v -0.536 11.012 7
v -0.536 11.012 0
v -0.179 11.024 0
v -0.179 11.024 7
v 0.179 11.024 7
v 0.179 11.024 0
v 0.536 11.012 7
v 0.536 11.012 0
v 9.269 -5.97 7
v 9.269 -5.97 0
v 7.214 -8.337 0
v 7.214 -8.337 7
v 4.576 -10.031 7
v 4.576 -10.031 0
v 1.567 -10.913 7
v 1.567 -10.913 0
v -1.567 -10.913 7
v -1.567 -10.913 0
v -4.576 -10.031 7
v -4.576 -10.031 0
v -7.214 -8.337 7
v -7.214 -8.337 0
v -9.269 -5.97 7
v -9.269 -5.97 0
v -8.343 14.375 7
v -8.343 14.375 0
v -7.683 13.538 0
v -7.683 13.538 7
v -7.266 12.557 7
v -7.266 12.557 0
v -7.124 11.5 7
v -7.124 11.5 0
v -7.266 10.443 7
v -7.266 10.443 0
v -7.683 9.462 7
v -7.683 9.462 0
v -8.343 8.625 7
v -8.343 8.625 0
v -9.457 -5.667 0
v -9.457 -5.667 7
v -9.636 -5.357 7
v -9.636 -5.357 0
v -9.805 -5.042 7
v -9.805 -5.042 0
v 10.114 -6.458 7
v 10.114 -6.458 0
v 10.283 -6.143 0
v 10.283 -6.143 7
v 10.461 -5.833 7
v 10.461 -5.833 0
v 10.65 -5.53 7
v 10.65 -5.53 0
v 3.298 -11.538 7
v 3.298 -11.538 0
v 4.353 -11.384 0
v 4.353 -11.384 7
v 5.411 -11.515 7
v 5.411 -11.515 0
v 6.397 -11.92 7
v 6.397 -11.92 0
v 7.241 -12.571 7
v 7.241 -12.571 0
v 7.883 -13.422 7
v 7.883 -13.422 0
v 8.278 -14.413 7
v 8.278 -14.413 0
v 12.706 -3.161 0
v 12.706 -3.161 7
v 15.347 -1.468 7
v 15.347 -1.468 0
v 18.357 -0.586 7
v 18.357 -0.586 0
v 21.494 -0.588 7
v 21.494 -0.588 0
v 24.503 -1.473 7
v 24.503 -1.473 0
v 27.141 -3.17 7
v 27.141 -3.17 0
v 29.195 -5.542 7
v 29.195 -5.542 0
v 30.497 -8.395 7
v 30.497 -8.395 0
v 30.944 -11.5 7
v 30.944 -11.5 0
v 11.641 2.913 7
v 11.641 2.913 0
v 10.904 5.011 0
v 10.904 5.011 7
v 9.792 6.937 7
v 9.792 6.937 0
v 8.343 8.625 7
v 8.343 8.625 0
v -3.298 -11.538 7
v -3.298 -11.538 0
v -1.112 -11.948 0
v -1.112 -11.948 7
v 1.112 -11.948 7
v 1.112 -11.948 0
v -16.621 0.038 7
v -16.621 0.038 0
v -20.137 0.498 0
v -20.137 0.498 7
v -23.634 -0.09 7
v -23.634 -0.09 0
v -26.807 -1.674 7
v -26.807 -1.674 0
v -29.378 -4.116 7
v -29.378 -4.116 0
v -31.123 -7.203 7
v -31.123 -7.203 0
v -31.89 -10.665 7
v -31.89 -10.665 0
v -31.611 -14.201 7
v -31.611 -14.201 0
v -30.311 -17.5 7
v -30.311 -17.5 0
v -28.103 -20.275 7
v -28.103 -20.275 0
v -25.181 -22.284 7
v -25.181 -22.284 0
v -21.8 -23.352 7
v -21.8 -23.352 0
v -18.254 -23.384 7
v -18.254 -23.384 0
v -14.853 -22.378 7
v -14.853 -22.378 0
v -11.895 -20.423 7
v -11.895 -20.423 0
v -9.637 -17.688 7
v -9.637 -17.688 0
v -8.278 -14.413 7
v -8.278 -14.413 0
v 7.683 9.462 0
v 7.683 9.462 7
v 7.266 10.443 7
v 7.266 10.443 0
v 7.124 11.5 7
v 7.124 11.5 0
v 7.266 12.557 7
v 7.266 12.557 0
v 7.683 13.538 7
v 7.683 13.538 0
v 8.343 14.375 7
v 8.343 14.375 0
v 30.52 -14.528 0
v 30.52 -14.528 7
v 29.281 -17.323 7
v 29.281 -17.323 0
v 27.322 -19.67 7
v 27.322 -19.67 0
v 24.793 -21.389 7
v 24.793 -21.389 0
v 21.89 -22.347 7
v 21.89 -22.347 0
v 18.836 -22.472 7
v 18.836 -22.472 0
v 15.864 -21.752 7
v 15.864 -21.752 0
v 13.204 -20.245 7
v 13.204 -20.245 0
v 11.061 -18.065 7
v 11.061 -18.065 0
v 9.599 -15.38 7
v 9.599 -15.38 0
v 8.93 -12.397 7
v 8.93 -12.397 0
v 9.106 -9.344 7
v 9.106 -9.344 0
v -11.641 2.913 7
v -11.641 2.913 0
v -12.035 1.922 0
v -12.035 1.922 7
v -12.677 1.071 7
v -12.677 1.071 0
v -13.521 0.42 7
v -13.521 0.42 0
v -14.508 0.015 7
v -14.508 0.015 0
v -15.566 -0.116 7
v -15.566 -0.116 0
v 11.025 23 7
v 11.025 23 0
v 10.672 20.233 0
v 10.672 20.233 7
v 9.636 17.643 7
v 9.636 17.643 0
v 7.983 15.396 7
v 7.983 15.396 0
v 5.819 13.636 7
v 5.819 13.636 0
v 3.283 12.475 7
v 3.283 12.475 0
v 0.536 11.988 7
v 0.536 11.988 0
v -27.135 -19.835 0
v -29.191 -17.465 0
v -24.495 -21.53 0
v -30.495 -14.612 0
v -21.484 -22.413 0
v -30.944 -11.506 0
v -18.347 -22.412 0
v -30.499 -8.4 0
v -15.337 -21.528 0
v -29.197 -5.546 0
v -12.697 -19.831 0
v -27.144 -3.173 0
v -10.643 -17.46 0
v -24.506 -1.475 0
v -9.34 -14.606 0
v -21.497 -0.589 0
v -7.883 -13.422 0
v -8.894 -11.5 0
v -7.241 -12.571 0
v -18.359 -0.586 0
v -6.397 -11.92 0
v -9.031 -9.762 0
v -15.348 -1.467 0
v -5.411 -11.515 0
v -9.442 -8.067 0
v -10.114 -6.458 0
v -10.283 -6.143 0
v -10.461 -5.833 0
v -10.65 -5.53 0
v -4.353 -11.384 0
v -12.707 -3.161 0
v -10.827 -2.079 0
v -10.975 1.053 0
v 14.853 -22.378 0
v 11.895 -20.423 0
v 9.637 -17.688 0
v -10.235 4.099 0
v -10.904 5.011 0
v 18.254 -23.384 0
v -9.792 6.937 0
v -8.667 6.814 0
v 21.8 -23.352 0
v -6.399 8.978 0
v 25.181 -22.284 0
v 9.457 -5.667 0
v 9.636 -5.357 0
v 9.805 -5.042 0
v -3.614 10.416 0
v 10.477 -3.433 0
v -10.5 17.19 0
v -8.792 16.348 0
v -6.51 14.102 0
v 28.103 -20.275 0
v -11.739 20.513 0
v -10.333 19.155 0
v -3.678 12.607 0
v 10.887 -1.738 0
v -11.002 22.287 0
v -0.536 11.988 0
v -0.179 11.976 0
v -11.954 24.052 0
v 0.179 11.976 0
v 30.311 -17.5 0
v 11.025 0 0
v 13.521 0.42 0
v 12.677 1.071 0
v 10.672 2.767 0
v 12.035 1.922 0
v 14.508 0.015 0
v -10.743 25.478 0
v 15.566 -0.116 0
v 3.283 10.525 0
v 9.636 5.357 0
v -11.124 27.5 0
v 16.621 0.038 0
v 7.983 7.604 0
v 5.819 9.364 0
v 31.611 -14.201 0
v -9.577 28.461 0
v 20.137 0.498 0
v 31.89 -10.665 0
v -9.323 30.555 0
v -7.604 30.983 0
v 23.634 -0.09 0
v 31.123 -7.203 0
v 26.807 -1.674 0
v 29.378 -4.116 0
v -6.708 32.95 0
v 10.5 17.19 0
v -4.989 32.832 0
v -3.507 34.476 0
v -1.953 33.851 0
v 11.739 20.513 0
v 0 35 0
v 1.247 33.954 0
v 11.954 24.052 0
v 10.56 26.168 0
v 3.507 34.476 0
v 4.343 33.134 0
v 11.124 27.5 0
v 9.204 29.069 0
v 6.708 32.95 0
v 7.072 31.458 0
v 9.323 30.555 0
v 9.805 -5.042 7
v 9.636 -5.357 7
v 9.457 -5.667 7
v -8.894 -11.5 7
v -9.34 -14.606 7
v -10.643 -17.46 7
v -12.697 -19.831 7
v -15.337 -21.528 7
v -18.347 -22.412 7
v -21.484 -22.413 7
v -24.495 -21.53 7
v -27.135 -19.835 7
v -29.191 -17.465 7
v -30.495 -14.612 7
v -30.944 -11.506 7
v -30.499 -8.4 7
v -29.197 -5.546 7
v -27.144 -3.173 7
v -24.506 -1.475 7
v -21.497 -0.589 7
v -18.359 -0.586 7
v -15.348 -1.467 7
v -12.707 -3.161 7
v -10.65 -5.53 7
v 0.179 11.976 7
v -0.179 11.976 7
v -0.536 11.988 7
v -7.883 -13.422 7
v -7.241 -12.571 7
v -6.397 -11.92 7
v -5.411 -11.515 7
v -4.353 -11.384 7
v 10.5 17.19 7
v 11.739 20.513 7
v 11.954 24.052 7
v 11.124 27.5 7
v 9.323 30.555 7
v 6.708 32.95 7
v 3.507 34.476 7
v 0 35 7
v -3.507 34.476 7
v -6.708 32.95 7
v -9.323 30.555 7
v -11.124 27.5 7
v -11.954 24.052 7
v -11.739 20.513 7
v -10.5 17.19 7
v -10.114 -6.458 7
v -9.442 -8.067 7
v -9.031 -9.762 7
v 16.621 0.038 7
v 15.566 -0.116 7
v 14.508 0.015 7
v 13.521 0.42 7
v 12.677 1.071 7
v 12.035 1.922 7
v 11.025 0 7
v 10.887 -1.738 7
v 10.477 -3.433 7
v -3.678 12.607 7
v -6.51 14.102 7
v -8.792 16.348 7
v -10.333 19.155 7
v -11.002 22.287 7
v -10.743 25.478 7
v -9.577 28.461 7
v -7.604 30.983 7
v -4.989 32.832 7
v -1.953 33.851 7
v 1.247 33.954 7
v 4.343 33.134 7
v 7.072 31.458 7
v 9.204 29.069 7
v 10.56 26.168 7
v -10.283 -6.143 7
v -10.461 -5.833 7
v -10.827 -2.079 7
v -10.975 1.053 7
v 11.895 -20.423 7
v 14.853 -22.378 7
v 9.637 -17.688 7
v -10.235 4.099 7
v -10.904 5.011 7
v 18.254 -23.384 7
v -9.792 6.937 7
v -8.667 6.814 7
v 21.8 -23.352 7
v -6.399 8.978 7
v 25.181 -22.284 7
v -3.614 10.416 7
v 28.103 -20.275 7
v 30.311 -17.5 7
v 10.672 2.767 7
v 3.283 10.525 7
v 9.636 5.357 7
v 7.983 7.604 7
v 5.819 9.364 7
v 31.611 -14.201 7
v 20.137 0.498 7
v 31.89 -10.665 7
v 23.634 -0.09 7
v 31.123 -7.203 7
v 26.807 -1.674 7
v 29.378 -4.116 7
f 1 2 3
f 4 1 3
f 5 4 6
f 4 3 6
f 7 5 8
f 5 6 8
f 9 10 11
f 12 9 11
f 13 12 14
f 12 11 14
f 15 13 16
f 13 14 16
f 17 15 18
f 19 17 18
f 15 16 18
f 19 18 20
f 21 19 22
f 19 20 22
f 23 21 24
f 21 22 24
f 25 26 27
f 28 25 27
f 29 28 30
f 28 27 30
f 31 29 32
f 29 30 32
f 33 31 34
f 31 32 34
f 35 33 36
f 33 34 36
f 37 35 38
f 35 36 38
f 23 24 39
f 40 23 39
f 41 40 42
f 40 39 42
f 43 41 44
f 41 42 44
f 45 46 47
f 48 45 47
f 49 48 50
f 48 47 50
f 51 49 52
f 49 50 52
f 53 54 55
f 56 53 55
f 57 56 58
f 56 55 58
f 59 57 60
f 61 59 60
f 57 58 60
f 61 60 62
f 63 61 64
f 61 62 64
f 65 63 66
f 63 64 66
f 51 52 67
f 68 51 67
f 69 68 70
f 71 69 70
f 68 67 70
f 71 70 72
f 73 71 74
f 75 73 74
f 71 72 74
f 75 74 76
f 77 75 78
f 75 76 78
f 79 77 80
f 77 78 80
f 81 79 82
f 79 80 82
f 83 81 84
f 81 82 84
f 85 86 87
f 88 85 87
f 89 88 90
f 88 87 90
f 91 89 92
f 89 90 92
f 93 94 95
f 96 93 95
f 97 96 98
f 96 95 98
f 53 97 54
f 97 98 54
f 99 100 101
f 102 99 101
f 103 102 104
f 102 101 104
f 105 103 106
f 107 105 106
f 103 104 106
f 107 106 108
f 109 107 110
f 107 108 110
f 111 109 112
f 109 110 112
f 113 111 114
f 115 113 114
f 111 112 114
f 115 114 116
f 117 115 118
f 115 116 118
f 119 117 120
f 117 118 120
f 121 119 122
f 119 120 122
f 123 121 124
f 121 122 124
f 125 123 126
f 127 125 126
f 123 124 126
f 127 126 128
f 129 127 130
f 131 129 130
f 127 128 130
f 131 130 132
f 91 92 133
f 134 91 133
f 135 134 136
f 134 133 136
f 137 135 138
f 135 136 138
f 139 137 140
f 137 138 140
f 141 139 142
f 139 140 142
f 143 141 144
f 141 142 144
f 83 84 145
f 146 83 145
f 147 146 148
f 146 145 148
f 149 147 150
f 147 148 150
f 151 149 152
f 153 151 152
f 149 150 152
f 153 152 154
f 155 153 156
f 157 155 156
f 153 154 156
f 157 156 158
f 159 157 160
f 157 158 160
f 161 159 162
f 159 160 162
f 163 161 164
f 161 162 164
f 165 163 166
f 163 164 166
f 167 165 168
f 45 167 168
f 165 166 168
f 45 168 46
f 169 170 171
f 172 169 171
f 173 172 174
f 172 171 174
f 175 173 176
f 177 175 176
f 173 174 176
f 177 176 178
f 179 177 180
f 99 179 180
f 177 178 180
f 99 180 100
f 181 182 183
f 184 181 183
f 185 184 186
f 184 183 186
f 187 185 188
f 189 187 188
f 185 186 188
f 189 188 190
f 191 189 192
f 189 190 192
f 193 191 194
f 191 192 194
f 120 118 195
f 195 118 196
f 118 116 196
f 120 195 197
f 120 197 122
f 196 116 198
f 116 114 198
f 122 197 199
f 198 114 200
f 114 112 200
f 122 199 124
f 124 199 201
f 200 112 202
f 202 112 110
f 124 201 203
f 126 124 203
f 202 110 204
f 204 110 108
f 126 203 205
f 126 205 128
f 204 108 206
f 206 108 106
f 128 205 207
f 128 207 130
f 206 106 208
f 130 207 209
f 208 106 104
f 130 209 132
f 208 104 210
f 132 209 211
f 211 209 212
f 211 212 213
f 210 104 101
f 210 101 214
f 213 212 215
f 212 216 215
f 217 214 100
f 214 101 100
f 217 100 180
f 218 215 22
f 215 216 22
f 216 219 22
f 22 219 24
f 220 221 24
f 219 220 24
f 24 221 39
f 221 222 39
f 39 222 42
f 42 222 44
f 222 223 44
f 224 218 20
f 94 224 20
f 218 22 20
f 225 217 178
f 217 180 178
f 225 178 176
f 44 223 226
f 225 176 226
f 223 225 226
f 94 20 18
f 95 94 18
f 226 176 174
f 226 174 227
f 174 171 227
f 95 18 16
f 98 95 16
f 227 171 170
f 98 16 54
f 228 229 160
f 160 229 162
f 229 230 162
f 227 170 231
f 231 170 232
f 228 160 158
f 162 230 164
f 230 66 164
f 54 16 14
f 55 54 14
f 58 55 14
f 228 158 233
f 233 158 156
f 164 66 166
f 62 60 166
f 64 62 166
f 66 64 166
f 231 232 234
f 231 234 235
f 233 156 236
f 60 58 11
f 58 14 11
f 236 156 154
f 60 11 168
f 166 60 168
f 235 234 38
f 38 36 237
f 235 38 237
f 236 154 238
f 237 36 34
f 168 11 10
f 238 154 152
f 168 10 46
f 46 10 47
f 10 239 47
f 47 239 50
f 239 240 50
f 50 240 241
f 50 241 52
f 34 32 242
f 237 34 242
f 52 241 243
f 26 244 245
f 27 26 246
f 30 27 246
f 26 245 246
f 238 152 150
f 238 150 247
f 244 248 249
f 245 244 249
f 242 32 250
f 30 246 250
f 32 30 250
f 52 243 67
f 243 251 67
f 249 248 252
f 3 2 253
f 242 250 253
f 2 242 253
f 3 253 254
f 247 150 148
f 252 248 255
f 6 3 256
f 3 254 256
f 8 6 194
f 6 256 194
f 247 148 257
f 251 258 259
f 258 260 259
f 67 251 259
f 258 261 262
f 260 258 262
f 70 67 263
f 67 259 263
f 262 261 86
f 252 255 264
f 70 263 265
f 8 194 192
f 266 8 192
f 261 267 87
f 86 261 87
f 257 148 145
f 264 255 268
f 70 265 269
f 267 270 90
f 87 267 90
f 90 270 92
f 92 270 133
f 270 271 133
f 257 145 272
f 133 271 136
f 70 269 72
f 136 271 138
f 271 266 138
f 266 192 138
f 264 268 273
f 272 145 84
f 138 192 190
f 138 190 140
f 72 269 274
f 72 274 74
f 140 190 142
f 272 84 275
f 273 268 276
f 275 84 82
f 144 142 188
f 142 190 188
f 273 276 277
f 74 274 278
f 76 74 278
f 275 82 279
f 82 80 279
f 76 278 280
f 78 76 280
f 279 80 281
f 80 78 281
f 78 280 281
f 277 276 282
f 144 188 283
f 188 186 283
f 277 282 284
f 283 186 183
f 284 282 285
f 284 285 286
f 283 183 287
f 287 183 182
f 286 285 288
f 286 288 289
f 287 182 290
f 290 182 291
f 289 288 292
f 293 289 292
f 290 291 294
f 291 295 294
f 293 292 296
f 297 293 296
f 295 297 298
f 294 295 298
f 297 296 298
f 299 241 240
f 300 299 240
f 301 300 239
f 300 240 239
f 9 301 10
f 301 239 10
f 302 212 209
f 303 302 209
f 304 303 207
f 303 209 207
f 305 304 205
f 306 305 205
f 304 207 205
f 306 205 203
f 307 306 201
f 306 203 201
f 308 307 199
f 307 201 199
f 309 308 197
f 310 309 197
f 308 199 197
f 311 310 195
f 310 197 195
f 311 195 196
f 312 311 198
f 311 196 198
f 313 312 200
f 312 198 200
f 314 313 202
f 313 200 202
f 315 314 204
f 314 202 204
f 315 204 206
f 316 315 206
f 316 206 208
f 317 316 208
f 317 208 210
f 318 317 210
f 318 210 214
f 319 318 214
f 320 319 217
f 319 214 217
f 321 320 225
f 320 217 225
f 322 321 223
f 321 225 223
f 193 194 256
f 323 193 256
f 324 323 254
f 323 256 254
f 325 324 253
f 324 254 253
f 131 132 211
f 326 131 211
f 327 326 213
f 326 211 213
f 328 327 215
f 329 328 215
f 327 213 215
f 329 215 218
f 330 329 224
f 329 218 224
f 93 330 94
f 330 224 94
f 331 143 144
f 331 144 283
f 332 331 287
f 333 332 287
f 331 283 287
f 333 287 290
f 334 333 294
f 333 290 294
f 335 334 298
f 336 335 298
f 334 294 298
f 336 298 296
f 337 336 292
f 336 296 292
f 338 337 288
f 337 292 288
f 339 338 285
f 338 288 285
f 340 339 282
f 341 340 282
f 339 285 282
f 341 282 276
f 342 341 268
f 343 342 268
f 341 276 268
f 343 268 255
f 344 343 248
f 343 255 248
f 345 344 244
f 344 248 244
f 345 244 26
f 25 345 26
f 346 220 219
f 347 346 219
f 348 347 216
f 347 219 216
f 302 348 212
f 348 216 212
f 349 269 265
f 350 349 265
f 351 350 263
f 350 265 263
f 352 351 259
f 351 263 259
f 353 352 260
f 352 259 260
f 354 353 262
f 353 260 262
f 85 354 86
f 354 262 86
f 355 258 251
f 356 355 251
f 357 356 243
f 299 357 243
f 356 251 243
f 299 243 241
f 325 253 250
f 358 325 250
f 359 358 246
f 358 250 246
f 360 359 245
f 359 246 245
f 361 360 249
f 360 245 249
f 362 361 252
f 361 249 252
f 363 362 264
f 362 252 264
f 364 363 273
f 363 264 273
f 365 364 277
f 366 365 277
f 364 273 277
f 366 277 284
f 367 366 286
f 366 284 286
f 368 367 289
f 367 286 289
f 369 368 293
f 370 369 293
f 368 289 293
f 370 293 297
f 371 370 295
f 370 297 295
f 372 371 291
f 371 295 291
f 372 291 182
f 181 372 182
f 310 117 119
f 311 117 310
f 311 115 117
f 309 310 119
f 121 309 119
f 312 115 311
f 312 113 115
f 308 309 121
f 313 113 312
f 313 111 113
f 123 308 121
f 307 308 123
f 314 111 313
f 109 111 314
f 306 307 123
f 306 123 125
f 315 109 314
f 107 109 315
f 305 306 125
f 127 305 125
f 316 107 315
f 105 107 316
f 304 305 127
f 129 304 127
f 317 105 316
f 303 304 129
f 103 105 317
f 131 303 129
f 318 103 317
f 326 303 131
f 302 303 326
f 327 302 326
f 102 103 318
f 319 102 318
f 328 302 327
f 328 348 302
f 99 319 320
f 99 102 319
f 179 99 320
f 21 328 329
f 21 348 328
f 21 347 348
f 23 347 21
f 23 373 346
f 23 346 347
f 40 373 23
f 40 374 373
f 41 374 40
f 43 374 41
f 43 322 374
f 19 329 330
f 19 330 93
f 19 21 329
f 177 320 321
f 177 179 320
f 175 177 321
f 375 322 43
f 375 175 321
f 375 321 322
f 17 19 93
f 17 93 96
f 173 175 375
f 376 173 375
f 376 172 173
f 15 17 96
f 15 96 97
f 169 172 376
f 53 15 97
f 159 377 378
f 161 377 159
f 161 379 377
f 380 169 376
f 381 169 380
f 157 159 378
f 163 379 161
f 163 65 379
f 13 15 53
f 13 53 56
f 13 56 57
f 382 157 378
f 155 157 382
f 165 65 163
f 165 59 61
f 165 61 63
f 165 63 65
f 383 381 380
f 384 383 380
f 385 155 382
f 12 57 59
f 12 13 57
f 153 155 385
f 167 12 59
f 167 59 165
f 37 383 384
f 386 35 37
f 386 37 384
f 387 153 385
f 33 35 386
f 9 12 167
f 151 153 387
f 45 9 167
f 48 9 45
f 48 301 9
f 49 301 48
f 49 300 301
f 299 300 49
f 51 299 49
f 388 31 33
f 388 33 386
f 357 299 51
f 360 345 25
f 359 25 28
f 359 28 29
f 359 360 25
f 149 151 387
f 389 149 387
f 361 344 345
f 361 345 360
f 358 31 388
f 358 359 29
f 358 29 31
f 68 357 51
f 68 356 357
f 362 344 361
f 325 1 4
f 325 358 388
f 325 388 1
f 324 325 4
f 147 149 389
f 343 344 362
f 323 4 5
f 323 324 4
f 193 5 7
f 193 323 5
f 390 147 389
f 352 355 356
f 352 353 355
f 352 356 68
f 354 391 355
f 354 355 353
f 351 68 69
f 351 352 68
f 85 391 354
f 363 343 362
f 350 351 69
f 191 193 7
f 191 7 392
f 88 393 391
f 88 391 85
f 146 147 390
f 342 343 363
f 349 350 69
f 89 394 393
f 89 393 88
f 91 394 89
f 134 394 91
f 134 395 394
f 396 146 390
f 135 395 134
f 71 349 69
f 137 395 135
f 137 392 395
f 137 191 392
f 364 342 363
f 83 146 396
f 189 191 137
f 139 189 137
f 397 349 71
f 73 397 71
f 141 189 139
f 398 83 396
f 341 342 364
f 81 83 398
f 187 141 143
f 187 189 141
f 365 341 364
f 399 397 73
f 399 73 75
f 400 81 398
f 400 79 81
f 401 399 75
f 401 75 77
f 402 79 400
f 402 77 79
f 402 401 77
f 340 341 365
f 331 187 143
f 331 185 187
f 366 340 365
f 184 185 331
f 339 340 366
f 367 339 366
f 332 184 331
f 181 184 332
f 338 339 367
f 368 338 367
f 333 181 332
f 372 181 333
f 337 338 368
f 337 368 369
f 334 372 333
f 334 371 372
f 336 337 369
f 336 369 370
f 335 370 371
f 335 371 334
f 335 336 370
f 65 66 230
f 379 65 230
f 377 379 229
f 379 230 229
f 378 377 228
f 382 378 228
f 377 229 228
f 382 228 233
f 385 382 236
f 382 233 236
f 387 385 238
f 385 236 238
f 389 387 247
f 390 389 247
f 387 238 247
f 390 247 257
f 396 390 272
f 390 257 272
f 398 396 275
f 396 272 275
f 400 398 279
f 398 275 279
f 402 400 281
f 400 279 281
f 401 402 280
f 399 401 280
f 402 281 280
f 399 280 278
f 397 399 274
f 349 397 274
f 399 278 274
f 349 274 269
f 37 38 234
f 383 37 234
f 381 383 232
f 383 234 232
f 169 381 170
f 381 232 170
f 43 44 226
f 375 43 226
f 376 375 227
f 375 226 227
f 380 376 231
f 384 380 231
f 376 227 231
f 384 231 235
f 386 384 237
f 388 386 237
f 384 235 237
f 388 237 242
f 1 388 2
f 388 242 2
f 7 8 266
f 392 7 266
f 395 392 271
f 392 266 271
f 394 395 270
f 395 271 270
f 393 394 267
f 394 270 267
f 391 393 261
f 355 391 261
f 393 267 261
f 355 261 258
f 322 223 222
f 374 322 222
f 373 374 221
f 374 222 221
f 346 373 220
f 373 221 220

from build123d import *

# Parameters (mm, degrees)
F1_DEPTH = 7


with BuildPart() as f1:
    # F0 (on Top) → F1 (new body)
    with BuildSketch(Plane.XY):
        with BuildLine():
            ThreePointArc((8.343223, 8.625), (7.124298, 11.5), (8.343223, 14.375))
            ThreePointArc((8.343223, 14.375), (0, 35), (-8.343223, 14.375))
            ThreePointArc((-8.343223, 14.375), (-7.124298, 11.5), (-8.343223, 8.625))
            ThreePointArc((-8.343223, 8.625), (-10.392305, 6), (-11.641081, 2.912943))
            ThreePointArc((-11.641081, 2.912943), (-13.521441, 0.419823), (-16.620727, 0.037943))
            ThreePointArc((-16.620727, 0.037943), (-30.310889, -17.5), (-8.277504, -14.412943))
            ThreePointArc((-8.277504, -14.412943), (-6.397143, -11.919823), (-3.297857, -11.537943))
            ThreePointArc((-3.297857, -11.537943), (0, -12), (3.297857, -11.537943))
            ThreePointArc((3.297857, -11.537943), (6.397143, -11.919823), (8.277504, -14.412943))
            ThreePointArc((8.277504, -14.412943), (30.310889, -17.5), (16.620727, 0.037943))
            ThreePointArc((16.620727, 0.037943), (13.521441, 0.419823), (11.641081, 2.912943))
            ThreePointArc((11.641081, 2.912943), (10.392305, 6), (8.343223, 8.625))
        make_face()
        with BuildLine():
            ThreePointArc((-10.114012, -6.458078), (-9.203034, -8.906237), (-8.893584, -11.5))
            ThreePointArc((-8.893584, -11.5), (-30.495404, -14.611511), (-10.649865, -5.529952))
            ThreePointArc((-10.649865, -5.529952), (-10.370654, -5.9875), (-10.114012, -6.458078))
        make_face(mode=Mode.SUBTRACT)
        with BuildLine():
            ThreePointArc((10.649865, -5.529952), (23.030095, -0.92318), (30.943584, -11.5))
            ThreePointArc((30.943584, -11.5), (17.324822, -22.21555), (10.114012, -6.458078))
            ThreePointArc((10.114012, -6.458078), (10.370654, -5.9875), (10.649865, -5.529952))
        make_face(mode=Mode.SUBTRACT)
        with BuildLine():
            ThreePointArc((0.535854, 11.01197), (7.983057, 7.60404), (11.025, 0))
            ThreePointArc((11.025, 0), (10.71555, -2.593763), (9.804573, -5.041922))
            ThreePointArc((9.804573, -5.041922), (9.54793, -5.5125), (9.268719, -5.970048))
            ThreePointArc((9.268719, -5.970048), (0, -11.025), (-9.268719, -5.970048))
            ThreePointArc((-9.268719, -5.970048), (-9.54793, -5.5125), (-9.804573, -5.041922))
            ThreePointArc((-9.804573, -5.041922), (-9.54793, 5.5125), (-0.535854, 11.01197))
            ThreePointArc((-0.535854, 11.01197), (0, 11.025), (0.535854, 11.01197))
        make_face(mode=Mode.SUBTRACT)
        with BuildLine():
            ThreePointArc((-0.535854, 11.98803), (-7.60404, 30.983057), (11.025, 23))
            ThreePointArc((11.025, 23), (7.983057, 15.39596), (0.535854, 11.98803))
            ThreePointArc((0.535854, 11.98803), (0, 11.975), (-0.535854, 11.98803))
        make_face(mode=Mode.SUBTRACT)
    extrude(amount=F1_DEPTH)


solid = f1.part
